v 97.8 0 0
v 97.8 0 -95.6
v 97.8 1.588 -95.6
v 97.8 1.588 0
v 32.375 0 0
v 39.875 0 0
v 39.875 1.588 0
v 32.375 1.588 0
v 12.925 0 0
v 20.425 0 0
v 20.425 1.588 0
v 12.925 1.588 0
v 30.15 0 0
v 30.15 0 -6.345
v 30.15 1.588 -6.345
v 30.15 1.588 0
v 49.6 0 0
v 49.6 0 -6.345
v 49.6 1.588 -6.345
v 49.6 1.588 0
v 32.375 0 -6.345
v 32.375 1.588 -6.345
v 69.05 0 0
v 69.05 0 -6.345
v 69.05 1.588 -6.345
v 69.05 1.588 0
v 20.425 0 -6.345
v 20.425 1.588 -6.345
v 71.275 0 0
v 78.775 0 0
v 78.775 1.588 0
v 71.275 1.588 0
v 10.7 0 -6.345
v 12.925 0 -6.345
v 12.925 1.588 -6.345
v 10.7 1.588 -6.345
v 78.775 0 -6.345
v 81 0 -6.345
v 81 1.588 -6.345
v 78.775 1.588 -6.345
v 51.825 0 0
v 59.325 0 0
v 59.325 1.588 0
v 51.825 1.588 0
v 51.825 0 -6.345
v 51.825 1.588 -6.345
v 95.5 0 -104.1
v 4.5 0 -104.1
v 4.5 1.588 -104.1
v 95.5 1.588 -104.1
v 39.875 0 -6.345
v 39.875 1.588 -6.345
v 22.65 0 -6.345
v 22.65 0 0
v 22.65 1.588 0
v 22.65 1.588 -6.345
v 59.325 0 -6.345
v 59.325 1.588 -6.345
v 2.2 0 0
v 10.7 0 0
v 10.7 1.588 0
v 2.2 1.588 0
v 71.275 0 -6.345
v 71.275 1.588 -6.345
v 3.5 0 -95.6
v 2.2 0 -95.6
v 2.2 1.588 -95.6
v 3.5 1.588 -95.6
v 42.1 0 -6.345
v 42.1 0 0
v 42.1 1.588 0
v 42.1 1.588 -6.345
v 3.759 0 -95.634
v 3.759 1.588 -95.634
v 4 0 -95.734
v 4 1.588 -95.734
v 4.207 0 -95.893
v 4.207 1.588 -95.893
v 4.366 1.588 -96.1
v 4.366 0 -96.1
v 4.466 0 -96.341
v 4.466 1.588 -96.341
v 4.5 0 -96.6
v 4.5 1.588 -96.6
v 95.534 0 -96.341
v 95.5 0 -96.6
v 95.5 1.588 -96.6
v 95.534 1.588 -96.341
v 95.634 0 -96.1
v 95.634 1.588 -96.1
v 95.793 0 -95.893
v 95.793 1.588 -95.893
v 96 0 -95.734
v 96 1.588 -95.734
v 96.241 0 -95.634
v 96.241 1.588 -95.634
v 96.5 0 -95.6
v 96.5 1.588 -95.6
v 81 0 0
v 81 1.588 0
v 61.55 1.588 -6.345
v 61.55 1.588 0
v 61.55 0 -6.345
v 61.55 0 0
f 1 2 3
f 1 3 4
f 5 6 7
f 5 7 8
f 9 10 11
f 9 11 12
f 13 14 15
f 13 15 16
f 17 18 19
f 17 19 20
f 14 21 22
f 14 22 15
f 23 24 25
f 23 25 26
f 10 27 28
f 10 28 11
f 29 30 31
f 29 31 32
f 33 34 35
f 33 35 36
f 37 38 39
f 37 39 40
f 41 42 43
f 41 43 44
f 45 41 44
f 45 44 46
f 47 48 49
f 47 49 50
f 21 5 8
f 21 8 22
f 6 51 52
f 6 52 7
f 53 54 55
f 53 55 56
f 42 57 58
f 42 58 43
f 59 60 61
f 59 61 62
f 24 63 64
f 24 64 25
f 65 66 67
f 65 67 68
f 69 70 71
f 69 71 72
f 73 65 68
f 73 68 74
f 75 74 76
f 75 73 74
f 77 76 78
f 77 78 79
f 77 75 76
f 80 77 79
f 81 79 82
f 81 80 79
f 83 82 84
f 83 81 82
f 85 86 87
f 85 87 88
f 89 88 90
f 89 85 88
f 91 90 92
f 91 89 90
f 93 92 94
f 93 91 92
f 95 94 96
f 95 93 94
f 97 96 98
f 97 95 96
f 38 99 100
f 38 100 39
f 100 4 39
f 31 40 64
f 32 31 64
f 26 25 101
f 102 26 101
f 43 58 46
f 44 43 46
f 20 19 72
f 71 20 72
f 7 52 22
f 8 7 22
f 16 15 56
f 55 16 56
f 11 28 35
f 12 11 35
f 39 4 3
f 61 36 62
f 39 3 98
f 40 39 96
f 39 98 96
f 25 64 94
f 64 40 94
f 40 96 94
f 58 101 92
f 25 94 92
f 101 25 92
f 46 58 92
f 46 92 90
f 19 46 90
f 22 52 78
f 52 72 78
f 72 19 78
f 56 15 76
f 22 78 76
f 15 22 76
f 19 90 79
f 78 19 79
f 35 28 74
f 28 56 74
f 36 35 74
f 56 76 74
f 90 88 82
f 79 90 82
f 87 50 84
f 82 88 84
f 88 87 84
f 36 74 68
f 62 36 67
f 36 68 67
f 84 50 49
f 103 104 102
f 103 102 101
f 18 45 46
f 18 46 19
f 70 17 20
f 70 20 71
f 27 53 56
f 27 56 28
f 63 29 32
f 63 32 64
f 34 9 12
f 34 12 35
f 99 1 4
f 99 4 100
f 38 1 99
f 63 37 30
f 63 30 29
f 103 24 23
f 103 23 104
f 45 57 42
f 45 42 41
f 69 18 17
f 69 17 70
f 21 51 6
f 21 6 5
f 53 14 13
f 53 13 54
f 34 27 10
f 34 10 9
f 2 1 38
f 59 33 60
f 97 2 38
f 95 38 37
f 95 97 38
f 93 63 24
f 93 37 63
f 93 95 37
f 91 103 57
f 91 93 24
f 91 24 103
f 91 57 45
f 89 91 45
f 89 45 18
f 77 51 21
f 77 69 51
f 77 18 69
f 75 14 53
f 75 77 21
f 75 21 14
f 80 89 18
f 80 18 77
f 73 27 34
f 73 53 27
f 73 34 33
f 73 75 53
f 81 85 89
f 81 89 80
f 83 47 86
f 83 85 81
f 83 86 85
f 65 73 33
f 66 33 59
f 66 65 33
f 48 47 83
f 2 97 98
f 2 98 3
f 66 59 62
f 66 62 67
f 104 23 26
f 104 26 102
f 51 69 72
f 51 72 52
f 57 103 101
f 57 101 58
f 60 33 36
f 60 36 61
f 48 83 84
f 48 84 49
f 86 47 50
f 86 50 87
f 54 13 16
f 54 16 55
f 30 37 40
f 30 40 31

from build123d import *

# Parameters (mm, degrees)
BOSS_EXTRUDE1_DEPTH = 1.5875


with BuildPart() as part:
    # Sketch1 → Boss-Extrude1 (new body)
    with BuildSketch(Plane(origin=(0, 0, 0), x_dir=(1, 0, 0), z_dir=(0, 1, 0))):
        with BuildLine():
            Line((4.5, 96.6), (4.5, 104.1))
            Line((4.5, 104.1), (95.5, 104.1))
            Line((95.5, 104.1), (95.5, 96.6))
            ThreePointArc((95.5, 96.6), (95.792893219, 95.892893219), (96.5, 95.6))
            Line((96.5, 95.6), (97.8, 95.6))
            Line((97.8, 95.6), (97.8, 0))
            Line((97.8, 0), (81, 0))
            Line((81, 0), (81, 6.344902398))
            Line((81, 6.344902398), (78.775, 6.344902398))
            Line((78.775, 6.344902398), (78.775, 0))
            Line((78.775, 0), (71.275, 0))
            Line((71.275, 0), (71.275, 6.344902398))
            Line((71.275, 6.344902398), (69.05, 6.344902398))
            Line((69.05, 6.344902398), (69.05, 0))
            Line((69.05, 0), (61.55, 0))
            Line((61.55, 0), (61.55, 6.344902398))
            Line((61.55, 6.344902398), (59.325, 6.344902398))
            Line((59.325, 6.344902398), (59.325, 0))
            Line((59.325, 0), (51.825, 0))
            Line((51.825, 0), (51.825, 6.344902398))
            Line((51.825, 6.344902398), (49.6, 6.344902398))
            Line((49.6, 6.344902398), (49.6, 0))
            Line((49.6, 0), (42.1, 0))
            Line((42.1, 0), (42.1, 6.344902398))
            Line((42.1, 6.344902398), (39.875, 6.344902398))
            Line((39.875, 6.344902398), (39.875, 0))
            Line((39.875, 0), (32.375, 0))
            Line((32.375, 0), (32.375, 6.344902398))
            Line((32.375, 6.344902398), (30.15, 6.344902398))
            Line((30.15, 6.344902398), (30.15, 0))
            Line((30.15, 0), (22.65, 0))
            Line((22.65, 0), (22.65, 6.344902398))
            Line((22.65, 6.344902398), (20.425, 6.344902398))
            Line((20.425, 6.344902398), (20.425, 0))
            Line((20.425, 0), (12.925, 0))
            Line((12.925, 0), (12.925, 6.344902398))
            Line((12.925, 6.344902398), (10.7, 6.344902398))
            Line((10.7, 6.344902398), (10.7, 0))
            Line((10.7, 0), (2.2, 0))
            Line((2.2, 0), (2.2, 95.6))
            Line((2.2, 95.6), (3.5, 95.6))
            ThreePointArc((3.5, 95.6), (4.207106781, 95.892893219), (4.5, 96.6))
        make_face()
    extrude(amount=BOSS_EXTRUDE1_DEPTH)


solid = part.part
